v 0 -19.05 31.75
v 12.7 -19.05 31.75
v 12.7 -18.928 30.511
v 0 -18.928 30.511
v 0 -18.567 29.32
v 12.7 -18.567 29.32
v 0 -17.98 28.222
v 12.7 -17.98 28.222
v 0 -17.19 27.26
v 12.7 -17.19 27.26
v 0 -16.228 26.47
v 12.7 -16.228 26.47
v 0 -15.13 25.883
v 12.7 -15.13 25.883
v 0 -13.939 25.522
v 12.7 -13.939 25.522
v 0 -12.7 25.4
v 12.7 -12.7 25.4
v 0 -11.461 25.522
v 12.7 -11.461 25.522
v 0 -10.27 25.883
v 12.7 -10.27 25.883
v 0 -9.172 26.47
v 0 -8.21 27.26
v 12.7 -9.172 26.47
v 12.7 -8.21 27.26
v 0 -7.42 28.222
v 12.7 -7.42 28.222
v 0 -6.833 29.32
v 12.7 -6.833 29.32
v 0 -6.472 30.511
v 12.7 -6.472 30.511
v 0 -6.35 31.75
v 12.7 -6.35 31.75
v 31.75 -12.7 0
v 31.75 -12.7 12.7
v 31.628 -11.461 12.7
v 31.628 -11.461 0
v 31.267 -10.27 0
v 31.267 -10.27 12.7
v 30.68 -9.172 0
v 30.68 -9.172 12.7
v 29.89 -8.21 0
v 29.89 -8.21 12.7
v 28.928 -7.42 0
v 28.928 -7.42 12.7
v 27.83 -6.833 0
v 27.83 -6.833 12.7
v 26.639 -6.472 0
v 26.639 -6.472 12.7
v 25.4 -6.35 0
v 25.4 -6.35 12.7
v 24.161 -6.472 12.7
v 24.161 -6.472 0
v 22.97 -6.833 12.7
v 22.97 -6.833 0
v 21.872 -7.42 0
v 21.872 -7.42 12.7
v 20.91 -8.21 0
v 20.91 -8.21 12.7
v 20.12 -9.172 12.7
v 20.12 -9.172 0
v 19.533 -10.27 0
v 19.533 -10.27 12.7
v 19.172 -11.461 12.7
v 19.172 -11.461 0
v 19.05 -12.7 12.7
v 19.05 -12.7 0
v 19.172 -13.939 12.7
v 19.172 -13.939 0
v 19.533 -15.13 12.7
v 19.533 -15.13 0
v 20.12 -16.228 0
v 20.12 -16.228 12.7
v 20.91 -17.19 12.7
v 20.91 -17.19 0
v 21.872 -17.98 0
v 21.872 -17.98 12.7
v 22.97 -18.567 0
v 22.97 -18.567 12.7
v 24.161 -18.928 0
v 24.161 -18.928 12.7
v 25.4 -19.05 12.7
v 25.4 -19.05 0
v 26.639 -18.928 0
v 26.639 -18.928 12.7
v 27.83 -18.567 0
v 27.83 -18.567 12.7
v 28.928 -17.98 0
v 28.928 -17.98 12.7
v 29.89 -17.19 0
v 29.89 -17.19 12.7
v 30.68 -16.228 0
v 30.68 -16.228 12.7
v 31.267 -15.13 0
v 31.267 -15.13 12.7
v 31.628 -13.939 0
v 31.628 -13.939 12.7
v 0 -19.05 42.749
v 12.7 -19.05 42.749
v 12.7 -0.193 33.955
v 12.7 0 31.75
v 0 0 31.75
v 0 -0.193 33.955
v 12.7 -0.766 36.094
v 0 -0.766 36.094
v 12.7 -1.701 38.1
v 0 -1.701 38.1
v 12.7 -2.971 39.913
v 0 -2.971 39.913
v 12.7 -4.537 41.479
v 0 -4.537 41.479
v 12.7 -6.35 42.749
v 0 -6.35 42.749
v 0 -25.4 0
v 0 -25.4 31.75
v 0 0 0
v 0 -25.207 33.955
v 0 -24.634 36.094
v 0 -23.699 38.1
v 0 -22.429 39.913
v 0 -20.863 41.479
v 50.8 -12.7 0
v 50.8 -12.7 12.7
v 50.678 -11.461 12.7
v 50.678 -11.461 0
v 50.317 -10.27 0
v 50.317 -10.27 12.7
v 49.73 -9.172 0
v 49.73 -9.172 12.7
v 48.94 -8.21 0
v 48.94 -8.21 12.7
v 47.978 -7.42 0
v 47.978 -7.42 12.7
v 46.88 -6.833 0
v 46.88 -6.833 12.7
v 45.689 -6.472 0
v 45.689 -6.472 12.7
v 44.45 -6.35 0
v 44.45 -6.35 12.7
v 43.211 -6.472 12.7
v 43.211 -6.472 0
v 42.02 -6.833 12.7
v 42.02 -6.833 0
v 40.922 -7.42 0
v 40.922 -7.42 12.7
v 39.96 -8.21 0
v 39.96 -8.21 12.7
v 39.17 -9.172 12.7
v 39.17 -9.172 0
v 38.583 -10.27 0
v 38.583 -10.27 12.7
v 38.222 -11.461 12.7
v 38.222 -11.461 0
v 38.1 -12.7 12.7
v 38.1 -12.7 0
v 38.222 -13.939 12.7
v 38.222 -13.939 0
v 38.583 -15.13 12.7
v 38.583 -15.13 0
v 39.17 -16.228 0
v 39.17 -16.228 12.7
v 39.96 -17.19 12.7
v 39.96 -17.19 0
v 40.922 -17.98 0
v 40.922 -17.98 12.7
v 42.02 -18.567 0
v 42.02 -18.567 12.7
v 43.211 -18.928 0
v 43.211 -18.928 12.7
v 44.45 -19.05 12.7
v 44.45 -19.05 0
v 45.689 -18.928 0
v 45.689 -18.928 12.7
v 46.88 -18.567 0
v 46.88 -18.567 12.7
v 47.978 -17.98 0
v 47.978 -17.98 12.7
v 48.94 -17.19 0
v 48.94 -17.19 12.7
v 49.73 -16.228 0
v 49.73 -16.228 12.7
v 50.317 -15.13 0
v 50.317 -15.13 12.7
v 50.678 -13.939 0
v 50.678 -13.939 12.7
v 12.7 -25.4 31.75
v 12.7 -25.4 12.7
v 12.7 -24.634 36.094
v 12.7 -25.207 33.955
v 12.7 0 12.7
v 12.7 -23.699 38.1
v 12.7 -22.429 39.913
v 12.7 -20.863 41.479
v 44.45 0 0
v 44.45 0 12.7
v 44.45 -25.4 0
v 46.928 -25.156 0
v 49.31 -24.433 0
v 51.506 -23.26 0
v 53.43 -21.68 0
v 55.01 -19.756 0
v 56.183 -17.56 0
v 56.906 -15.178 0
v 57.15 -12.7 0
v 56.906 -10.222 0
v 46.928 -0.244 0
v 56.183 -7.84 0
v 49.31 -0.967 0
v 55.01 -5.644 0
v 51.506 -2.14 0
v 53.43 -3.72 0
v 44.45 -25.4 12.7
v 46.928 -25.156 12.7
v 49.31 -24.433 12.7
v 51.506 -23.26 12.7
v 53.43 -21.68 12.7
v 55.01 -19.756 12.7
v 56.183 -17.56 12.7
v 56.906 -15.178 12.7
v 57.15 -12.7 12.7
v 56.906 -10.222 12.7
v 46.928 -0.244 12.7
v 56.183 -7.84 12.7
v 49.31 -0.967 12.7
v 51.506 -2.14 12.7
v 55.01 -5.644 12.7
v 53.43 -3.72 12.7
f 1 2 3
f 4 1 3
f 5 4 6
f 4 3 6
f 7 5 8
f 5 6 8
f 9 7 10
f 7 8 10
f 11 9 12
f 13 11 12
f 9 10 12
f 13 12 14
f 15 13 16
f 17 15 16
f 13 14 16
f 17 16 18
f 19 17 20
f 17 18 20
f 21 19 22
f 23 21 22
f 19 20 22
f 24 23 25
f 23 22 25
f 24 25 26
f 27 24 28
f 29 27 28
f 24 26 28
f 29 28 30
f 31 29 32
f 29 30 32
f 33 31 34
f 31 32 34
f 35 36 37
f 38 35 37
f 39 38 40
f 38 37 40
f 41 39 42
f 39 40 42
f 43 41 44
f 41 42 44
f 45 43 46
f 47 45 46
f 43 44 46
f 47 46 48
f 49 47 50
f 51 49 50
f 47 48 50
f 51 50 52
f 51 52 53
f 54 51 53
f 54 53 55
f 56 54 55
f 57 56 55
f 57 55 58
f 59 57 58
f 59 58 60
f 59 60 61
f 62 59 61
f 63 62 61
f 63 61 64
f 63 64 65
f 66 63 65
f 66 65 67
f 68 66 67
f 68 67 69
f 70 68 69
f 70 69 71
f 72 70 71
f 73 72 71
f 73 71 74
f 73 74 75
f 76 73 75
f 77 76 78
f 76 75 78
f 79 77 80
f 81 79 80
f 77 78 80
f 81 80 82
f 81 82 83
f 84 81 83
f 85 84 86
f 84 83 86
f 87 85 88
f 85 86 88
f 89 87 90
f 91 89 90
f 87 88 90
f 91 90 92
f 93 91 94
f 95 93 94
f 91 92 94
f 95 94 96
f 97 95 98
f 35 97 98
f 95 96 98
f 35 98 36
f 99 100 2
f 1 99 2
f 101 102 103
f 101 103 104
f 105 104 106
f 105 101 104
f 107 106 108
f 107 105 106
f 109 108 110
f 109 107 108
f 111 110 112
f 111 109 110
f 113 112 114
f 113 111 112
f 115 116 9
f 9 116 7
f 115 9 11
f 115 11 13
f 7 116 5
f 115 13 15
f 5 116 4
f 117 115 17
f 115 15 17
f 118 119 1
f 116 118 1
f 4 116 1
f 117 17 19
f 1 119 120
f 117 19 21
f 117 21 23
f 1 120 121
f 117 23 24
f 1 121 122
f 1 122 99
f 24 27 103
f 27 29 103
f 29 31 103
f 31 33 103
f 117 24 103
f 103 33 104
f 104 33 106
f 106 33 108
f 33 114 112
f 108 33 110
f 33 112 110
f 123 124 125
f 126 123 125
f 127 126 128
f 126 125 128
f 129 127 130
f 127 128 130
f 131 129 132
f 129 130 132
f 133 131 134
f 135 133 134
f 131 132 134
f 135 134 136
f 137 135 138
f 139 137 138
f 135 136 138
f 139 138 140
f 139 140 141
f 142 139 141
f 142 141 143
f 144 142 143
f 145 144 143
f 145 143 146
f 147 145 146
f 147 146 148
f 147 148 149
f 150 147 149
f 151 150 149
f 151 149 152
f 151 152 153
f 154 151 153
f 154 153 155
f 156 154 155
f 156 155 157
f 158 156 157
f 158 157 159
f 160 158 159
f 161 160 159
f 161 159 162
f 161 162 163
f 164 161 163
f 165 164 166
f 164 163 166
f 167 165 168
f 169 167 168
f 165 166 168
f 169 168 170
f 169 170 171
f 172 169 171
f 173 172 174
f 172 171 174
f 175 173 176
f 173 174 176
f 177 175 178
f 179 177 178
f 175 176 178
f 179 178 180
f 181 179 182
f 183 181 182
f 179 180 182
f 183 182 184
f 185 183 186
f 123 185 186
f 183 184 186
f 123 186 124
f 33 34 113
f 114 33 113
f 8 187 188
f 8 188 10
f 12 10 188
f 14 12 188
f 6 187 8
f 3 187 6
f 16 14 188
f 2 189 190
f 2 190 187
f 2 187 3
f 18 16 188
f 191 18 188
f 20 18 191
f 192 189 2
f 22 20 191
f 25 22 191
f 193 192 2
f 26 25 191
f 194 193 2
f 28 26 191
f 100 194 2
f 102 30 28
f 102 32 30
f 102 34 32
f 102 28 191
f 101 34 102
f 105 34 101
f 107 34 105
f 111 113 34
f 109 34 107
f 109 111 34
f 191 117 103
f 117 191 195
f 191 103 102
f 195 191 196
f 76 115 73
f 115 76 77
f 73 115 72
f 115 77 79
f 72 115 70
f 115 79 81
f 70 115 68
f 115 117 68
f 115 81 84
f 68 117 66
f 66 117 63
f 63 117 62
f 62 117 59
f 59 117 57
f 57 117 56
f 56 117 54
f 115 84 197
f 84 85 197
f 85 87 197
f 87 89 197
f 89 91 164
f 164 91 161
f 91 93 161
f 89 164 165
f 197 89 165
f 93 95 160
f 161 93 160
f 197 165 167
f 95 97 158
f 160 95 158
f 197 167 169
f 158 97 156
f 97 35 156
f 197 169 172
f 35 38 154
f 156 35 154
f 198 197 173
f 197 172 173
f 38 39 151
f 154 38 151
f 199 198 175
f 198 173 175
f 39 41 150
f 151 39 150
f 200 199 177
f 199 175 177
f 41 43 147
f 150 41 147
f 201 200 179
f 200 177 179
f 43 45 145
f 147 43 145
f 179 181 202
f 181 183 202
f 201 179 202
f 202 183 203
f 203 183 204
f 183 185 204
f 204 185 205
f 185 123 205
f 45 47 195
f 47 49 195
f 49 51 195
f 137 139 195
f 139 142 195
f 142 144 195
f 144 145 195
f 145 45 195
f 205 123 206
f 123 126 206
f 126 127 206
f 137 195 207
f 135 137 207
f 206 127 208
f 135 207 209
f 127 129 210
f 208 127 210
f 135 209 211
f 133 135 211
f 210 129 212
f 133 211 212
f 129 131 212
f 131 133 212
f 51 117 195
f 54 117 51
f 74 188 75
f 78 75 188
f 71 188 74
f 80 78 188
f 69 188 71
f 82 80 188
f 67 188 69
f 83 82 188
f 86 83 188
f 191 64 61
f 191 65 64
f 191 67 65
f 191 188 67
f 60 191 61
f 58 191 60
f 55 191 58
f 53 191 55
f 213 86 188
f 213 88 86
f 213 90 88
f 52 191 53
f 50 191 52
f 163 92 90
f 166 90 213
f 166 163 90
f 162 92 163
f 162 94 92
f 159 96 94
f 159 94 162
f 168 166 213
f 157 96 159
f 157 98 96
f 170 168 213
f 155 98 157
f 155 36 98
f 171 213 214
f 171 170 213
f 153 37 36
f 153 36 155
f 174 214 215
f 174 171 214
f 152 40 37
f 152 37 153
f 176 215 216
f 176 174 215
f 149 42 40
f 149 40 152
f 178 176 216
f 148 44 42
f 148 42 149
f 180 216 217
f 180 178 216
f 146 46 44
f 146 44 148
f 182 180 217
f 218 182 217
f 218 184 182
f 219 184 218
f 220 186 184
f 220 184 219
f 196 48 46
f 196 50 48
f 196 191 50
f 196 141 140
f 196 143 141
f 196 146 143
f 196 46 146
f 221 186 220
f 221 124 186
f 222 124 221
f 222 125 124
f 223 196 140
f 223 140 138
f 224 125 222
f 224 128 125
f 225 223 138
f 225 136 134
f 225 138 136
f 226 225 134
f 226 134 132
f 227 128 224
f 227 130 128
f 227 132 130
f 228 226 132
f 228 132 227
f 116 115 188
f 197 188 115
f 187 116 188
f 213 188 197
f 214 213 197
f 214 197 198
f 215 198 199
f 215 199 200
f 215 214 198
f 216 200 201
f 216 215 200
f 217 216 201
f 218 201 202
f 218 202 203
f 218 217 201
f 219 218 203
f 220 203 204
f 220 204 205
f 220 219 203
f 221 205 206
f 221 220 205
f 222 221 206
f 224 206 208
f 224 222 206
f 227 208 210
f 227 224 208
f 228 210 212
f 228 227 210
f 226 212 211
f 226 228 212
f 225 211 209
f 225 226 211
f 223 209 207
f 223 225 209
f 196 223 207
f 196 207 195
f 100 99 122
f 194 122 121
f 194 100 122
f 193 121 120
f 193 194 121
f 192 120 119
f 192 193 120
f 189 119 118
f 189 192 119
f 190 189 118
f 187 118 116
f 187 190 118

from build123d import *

# Parameters (mm, degrees)
F0_W      = 44.45
F0_H      = 31.75
F1_DEPTH  = 25.4
F2_W      = 31.75
F2_H      = 19.05
F3_DEPTH  = 25.4
F5_DEPTH  = 12.7
F7_DEPTH  = 12.7
F9_DEPTH  = 25.4
F10_R     = 6.35
F11_DEPTH = 25.4


with BuildPart() as f1:
    # F0 (on Front) → F1 (new body)
    with BuildSketch(Plane.XZ):
        with Locations((22.225, 15.875)):
            Rectangle(F0_W, F0_H)
    extrude(amount=F1_DEPTH)

    # F2 (on face) → F3 (cut)
    with BuildSketch(Plane.XZ.offset(25.4)):
        with Locations((28.575, 22.225)):
            Rectangle(F2_W, F2_H)
    extrude(amount=-F3_DEPTH, mode=Mode.SUBTRACT)

    # F4 (on face) → F5 (join)
    with BuildSketch(Plane.XY.offset(12.7)):
        with BuildLine():
            Line((44.45, 0), (44.45, -25.4))
            ThreePointArc((44.45, -25.4), (57.15, -12.7), (44.45, 0))
        make_face()
    extrude(amount=-F5_DEPTH)

    # F6 (on face) → F7 (join)
    with BuildSketch(Plane.YZ.offset(12.7)):
        with BuildLine():
            Line((-25.4, 31.75), (0, 31.75))
            ThreePointArc((0, 31.75), (-12.7, 44.45), (-25.4, 31.75))
        make_face()
    extrude(amount=-F7_DEPTH)

    # F8 (on face) → F9 (cut)
    with BuildSketch(Plane.YZ.offset(12.7)):
        with BuildLine():
            Line((-19.05, 42.7485226281), (-19.05, 31.75))
            ThreePointArc((-19.05, 31.75), (-12.7, 25.4), (-6.35, 31.75))
            Line((-6.35, 31.75), (-6.35, 42.7485226281))
            ThreePointArc((-6.35, 42.7485226281), (-12.7, 44.45), (-19.05, 42.7485226281))
        make_face()
    extrude(amount=-F9_DEPTH, mode=Mode.SUBTRACT)

    # F10 (on face) → F11 (cut)
    with BuildSketch(Plane.XY.offset(12.7)):
        with Locations((44.45, -12.7)):
            Circle(F10_R)
        with Locations((25.4, -12.7)):
            Circle(F10_R)
    extrude(amount=-F11_DEPTH, mode=Mode.SUBTRACT)


solid = f1.part
